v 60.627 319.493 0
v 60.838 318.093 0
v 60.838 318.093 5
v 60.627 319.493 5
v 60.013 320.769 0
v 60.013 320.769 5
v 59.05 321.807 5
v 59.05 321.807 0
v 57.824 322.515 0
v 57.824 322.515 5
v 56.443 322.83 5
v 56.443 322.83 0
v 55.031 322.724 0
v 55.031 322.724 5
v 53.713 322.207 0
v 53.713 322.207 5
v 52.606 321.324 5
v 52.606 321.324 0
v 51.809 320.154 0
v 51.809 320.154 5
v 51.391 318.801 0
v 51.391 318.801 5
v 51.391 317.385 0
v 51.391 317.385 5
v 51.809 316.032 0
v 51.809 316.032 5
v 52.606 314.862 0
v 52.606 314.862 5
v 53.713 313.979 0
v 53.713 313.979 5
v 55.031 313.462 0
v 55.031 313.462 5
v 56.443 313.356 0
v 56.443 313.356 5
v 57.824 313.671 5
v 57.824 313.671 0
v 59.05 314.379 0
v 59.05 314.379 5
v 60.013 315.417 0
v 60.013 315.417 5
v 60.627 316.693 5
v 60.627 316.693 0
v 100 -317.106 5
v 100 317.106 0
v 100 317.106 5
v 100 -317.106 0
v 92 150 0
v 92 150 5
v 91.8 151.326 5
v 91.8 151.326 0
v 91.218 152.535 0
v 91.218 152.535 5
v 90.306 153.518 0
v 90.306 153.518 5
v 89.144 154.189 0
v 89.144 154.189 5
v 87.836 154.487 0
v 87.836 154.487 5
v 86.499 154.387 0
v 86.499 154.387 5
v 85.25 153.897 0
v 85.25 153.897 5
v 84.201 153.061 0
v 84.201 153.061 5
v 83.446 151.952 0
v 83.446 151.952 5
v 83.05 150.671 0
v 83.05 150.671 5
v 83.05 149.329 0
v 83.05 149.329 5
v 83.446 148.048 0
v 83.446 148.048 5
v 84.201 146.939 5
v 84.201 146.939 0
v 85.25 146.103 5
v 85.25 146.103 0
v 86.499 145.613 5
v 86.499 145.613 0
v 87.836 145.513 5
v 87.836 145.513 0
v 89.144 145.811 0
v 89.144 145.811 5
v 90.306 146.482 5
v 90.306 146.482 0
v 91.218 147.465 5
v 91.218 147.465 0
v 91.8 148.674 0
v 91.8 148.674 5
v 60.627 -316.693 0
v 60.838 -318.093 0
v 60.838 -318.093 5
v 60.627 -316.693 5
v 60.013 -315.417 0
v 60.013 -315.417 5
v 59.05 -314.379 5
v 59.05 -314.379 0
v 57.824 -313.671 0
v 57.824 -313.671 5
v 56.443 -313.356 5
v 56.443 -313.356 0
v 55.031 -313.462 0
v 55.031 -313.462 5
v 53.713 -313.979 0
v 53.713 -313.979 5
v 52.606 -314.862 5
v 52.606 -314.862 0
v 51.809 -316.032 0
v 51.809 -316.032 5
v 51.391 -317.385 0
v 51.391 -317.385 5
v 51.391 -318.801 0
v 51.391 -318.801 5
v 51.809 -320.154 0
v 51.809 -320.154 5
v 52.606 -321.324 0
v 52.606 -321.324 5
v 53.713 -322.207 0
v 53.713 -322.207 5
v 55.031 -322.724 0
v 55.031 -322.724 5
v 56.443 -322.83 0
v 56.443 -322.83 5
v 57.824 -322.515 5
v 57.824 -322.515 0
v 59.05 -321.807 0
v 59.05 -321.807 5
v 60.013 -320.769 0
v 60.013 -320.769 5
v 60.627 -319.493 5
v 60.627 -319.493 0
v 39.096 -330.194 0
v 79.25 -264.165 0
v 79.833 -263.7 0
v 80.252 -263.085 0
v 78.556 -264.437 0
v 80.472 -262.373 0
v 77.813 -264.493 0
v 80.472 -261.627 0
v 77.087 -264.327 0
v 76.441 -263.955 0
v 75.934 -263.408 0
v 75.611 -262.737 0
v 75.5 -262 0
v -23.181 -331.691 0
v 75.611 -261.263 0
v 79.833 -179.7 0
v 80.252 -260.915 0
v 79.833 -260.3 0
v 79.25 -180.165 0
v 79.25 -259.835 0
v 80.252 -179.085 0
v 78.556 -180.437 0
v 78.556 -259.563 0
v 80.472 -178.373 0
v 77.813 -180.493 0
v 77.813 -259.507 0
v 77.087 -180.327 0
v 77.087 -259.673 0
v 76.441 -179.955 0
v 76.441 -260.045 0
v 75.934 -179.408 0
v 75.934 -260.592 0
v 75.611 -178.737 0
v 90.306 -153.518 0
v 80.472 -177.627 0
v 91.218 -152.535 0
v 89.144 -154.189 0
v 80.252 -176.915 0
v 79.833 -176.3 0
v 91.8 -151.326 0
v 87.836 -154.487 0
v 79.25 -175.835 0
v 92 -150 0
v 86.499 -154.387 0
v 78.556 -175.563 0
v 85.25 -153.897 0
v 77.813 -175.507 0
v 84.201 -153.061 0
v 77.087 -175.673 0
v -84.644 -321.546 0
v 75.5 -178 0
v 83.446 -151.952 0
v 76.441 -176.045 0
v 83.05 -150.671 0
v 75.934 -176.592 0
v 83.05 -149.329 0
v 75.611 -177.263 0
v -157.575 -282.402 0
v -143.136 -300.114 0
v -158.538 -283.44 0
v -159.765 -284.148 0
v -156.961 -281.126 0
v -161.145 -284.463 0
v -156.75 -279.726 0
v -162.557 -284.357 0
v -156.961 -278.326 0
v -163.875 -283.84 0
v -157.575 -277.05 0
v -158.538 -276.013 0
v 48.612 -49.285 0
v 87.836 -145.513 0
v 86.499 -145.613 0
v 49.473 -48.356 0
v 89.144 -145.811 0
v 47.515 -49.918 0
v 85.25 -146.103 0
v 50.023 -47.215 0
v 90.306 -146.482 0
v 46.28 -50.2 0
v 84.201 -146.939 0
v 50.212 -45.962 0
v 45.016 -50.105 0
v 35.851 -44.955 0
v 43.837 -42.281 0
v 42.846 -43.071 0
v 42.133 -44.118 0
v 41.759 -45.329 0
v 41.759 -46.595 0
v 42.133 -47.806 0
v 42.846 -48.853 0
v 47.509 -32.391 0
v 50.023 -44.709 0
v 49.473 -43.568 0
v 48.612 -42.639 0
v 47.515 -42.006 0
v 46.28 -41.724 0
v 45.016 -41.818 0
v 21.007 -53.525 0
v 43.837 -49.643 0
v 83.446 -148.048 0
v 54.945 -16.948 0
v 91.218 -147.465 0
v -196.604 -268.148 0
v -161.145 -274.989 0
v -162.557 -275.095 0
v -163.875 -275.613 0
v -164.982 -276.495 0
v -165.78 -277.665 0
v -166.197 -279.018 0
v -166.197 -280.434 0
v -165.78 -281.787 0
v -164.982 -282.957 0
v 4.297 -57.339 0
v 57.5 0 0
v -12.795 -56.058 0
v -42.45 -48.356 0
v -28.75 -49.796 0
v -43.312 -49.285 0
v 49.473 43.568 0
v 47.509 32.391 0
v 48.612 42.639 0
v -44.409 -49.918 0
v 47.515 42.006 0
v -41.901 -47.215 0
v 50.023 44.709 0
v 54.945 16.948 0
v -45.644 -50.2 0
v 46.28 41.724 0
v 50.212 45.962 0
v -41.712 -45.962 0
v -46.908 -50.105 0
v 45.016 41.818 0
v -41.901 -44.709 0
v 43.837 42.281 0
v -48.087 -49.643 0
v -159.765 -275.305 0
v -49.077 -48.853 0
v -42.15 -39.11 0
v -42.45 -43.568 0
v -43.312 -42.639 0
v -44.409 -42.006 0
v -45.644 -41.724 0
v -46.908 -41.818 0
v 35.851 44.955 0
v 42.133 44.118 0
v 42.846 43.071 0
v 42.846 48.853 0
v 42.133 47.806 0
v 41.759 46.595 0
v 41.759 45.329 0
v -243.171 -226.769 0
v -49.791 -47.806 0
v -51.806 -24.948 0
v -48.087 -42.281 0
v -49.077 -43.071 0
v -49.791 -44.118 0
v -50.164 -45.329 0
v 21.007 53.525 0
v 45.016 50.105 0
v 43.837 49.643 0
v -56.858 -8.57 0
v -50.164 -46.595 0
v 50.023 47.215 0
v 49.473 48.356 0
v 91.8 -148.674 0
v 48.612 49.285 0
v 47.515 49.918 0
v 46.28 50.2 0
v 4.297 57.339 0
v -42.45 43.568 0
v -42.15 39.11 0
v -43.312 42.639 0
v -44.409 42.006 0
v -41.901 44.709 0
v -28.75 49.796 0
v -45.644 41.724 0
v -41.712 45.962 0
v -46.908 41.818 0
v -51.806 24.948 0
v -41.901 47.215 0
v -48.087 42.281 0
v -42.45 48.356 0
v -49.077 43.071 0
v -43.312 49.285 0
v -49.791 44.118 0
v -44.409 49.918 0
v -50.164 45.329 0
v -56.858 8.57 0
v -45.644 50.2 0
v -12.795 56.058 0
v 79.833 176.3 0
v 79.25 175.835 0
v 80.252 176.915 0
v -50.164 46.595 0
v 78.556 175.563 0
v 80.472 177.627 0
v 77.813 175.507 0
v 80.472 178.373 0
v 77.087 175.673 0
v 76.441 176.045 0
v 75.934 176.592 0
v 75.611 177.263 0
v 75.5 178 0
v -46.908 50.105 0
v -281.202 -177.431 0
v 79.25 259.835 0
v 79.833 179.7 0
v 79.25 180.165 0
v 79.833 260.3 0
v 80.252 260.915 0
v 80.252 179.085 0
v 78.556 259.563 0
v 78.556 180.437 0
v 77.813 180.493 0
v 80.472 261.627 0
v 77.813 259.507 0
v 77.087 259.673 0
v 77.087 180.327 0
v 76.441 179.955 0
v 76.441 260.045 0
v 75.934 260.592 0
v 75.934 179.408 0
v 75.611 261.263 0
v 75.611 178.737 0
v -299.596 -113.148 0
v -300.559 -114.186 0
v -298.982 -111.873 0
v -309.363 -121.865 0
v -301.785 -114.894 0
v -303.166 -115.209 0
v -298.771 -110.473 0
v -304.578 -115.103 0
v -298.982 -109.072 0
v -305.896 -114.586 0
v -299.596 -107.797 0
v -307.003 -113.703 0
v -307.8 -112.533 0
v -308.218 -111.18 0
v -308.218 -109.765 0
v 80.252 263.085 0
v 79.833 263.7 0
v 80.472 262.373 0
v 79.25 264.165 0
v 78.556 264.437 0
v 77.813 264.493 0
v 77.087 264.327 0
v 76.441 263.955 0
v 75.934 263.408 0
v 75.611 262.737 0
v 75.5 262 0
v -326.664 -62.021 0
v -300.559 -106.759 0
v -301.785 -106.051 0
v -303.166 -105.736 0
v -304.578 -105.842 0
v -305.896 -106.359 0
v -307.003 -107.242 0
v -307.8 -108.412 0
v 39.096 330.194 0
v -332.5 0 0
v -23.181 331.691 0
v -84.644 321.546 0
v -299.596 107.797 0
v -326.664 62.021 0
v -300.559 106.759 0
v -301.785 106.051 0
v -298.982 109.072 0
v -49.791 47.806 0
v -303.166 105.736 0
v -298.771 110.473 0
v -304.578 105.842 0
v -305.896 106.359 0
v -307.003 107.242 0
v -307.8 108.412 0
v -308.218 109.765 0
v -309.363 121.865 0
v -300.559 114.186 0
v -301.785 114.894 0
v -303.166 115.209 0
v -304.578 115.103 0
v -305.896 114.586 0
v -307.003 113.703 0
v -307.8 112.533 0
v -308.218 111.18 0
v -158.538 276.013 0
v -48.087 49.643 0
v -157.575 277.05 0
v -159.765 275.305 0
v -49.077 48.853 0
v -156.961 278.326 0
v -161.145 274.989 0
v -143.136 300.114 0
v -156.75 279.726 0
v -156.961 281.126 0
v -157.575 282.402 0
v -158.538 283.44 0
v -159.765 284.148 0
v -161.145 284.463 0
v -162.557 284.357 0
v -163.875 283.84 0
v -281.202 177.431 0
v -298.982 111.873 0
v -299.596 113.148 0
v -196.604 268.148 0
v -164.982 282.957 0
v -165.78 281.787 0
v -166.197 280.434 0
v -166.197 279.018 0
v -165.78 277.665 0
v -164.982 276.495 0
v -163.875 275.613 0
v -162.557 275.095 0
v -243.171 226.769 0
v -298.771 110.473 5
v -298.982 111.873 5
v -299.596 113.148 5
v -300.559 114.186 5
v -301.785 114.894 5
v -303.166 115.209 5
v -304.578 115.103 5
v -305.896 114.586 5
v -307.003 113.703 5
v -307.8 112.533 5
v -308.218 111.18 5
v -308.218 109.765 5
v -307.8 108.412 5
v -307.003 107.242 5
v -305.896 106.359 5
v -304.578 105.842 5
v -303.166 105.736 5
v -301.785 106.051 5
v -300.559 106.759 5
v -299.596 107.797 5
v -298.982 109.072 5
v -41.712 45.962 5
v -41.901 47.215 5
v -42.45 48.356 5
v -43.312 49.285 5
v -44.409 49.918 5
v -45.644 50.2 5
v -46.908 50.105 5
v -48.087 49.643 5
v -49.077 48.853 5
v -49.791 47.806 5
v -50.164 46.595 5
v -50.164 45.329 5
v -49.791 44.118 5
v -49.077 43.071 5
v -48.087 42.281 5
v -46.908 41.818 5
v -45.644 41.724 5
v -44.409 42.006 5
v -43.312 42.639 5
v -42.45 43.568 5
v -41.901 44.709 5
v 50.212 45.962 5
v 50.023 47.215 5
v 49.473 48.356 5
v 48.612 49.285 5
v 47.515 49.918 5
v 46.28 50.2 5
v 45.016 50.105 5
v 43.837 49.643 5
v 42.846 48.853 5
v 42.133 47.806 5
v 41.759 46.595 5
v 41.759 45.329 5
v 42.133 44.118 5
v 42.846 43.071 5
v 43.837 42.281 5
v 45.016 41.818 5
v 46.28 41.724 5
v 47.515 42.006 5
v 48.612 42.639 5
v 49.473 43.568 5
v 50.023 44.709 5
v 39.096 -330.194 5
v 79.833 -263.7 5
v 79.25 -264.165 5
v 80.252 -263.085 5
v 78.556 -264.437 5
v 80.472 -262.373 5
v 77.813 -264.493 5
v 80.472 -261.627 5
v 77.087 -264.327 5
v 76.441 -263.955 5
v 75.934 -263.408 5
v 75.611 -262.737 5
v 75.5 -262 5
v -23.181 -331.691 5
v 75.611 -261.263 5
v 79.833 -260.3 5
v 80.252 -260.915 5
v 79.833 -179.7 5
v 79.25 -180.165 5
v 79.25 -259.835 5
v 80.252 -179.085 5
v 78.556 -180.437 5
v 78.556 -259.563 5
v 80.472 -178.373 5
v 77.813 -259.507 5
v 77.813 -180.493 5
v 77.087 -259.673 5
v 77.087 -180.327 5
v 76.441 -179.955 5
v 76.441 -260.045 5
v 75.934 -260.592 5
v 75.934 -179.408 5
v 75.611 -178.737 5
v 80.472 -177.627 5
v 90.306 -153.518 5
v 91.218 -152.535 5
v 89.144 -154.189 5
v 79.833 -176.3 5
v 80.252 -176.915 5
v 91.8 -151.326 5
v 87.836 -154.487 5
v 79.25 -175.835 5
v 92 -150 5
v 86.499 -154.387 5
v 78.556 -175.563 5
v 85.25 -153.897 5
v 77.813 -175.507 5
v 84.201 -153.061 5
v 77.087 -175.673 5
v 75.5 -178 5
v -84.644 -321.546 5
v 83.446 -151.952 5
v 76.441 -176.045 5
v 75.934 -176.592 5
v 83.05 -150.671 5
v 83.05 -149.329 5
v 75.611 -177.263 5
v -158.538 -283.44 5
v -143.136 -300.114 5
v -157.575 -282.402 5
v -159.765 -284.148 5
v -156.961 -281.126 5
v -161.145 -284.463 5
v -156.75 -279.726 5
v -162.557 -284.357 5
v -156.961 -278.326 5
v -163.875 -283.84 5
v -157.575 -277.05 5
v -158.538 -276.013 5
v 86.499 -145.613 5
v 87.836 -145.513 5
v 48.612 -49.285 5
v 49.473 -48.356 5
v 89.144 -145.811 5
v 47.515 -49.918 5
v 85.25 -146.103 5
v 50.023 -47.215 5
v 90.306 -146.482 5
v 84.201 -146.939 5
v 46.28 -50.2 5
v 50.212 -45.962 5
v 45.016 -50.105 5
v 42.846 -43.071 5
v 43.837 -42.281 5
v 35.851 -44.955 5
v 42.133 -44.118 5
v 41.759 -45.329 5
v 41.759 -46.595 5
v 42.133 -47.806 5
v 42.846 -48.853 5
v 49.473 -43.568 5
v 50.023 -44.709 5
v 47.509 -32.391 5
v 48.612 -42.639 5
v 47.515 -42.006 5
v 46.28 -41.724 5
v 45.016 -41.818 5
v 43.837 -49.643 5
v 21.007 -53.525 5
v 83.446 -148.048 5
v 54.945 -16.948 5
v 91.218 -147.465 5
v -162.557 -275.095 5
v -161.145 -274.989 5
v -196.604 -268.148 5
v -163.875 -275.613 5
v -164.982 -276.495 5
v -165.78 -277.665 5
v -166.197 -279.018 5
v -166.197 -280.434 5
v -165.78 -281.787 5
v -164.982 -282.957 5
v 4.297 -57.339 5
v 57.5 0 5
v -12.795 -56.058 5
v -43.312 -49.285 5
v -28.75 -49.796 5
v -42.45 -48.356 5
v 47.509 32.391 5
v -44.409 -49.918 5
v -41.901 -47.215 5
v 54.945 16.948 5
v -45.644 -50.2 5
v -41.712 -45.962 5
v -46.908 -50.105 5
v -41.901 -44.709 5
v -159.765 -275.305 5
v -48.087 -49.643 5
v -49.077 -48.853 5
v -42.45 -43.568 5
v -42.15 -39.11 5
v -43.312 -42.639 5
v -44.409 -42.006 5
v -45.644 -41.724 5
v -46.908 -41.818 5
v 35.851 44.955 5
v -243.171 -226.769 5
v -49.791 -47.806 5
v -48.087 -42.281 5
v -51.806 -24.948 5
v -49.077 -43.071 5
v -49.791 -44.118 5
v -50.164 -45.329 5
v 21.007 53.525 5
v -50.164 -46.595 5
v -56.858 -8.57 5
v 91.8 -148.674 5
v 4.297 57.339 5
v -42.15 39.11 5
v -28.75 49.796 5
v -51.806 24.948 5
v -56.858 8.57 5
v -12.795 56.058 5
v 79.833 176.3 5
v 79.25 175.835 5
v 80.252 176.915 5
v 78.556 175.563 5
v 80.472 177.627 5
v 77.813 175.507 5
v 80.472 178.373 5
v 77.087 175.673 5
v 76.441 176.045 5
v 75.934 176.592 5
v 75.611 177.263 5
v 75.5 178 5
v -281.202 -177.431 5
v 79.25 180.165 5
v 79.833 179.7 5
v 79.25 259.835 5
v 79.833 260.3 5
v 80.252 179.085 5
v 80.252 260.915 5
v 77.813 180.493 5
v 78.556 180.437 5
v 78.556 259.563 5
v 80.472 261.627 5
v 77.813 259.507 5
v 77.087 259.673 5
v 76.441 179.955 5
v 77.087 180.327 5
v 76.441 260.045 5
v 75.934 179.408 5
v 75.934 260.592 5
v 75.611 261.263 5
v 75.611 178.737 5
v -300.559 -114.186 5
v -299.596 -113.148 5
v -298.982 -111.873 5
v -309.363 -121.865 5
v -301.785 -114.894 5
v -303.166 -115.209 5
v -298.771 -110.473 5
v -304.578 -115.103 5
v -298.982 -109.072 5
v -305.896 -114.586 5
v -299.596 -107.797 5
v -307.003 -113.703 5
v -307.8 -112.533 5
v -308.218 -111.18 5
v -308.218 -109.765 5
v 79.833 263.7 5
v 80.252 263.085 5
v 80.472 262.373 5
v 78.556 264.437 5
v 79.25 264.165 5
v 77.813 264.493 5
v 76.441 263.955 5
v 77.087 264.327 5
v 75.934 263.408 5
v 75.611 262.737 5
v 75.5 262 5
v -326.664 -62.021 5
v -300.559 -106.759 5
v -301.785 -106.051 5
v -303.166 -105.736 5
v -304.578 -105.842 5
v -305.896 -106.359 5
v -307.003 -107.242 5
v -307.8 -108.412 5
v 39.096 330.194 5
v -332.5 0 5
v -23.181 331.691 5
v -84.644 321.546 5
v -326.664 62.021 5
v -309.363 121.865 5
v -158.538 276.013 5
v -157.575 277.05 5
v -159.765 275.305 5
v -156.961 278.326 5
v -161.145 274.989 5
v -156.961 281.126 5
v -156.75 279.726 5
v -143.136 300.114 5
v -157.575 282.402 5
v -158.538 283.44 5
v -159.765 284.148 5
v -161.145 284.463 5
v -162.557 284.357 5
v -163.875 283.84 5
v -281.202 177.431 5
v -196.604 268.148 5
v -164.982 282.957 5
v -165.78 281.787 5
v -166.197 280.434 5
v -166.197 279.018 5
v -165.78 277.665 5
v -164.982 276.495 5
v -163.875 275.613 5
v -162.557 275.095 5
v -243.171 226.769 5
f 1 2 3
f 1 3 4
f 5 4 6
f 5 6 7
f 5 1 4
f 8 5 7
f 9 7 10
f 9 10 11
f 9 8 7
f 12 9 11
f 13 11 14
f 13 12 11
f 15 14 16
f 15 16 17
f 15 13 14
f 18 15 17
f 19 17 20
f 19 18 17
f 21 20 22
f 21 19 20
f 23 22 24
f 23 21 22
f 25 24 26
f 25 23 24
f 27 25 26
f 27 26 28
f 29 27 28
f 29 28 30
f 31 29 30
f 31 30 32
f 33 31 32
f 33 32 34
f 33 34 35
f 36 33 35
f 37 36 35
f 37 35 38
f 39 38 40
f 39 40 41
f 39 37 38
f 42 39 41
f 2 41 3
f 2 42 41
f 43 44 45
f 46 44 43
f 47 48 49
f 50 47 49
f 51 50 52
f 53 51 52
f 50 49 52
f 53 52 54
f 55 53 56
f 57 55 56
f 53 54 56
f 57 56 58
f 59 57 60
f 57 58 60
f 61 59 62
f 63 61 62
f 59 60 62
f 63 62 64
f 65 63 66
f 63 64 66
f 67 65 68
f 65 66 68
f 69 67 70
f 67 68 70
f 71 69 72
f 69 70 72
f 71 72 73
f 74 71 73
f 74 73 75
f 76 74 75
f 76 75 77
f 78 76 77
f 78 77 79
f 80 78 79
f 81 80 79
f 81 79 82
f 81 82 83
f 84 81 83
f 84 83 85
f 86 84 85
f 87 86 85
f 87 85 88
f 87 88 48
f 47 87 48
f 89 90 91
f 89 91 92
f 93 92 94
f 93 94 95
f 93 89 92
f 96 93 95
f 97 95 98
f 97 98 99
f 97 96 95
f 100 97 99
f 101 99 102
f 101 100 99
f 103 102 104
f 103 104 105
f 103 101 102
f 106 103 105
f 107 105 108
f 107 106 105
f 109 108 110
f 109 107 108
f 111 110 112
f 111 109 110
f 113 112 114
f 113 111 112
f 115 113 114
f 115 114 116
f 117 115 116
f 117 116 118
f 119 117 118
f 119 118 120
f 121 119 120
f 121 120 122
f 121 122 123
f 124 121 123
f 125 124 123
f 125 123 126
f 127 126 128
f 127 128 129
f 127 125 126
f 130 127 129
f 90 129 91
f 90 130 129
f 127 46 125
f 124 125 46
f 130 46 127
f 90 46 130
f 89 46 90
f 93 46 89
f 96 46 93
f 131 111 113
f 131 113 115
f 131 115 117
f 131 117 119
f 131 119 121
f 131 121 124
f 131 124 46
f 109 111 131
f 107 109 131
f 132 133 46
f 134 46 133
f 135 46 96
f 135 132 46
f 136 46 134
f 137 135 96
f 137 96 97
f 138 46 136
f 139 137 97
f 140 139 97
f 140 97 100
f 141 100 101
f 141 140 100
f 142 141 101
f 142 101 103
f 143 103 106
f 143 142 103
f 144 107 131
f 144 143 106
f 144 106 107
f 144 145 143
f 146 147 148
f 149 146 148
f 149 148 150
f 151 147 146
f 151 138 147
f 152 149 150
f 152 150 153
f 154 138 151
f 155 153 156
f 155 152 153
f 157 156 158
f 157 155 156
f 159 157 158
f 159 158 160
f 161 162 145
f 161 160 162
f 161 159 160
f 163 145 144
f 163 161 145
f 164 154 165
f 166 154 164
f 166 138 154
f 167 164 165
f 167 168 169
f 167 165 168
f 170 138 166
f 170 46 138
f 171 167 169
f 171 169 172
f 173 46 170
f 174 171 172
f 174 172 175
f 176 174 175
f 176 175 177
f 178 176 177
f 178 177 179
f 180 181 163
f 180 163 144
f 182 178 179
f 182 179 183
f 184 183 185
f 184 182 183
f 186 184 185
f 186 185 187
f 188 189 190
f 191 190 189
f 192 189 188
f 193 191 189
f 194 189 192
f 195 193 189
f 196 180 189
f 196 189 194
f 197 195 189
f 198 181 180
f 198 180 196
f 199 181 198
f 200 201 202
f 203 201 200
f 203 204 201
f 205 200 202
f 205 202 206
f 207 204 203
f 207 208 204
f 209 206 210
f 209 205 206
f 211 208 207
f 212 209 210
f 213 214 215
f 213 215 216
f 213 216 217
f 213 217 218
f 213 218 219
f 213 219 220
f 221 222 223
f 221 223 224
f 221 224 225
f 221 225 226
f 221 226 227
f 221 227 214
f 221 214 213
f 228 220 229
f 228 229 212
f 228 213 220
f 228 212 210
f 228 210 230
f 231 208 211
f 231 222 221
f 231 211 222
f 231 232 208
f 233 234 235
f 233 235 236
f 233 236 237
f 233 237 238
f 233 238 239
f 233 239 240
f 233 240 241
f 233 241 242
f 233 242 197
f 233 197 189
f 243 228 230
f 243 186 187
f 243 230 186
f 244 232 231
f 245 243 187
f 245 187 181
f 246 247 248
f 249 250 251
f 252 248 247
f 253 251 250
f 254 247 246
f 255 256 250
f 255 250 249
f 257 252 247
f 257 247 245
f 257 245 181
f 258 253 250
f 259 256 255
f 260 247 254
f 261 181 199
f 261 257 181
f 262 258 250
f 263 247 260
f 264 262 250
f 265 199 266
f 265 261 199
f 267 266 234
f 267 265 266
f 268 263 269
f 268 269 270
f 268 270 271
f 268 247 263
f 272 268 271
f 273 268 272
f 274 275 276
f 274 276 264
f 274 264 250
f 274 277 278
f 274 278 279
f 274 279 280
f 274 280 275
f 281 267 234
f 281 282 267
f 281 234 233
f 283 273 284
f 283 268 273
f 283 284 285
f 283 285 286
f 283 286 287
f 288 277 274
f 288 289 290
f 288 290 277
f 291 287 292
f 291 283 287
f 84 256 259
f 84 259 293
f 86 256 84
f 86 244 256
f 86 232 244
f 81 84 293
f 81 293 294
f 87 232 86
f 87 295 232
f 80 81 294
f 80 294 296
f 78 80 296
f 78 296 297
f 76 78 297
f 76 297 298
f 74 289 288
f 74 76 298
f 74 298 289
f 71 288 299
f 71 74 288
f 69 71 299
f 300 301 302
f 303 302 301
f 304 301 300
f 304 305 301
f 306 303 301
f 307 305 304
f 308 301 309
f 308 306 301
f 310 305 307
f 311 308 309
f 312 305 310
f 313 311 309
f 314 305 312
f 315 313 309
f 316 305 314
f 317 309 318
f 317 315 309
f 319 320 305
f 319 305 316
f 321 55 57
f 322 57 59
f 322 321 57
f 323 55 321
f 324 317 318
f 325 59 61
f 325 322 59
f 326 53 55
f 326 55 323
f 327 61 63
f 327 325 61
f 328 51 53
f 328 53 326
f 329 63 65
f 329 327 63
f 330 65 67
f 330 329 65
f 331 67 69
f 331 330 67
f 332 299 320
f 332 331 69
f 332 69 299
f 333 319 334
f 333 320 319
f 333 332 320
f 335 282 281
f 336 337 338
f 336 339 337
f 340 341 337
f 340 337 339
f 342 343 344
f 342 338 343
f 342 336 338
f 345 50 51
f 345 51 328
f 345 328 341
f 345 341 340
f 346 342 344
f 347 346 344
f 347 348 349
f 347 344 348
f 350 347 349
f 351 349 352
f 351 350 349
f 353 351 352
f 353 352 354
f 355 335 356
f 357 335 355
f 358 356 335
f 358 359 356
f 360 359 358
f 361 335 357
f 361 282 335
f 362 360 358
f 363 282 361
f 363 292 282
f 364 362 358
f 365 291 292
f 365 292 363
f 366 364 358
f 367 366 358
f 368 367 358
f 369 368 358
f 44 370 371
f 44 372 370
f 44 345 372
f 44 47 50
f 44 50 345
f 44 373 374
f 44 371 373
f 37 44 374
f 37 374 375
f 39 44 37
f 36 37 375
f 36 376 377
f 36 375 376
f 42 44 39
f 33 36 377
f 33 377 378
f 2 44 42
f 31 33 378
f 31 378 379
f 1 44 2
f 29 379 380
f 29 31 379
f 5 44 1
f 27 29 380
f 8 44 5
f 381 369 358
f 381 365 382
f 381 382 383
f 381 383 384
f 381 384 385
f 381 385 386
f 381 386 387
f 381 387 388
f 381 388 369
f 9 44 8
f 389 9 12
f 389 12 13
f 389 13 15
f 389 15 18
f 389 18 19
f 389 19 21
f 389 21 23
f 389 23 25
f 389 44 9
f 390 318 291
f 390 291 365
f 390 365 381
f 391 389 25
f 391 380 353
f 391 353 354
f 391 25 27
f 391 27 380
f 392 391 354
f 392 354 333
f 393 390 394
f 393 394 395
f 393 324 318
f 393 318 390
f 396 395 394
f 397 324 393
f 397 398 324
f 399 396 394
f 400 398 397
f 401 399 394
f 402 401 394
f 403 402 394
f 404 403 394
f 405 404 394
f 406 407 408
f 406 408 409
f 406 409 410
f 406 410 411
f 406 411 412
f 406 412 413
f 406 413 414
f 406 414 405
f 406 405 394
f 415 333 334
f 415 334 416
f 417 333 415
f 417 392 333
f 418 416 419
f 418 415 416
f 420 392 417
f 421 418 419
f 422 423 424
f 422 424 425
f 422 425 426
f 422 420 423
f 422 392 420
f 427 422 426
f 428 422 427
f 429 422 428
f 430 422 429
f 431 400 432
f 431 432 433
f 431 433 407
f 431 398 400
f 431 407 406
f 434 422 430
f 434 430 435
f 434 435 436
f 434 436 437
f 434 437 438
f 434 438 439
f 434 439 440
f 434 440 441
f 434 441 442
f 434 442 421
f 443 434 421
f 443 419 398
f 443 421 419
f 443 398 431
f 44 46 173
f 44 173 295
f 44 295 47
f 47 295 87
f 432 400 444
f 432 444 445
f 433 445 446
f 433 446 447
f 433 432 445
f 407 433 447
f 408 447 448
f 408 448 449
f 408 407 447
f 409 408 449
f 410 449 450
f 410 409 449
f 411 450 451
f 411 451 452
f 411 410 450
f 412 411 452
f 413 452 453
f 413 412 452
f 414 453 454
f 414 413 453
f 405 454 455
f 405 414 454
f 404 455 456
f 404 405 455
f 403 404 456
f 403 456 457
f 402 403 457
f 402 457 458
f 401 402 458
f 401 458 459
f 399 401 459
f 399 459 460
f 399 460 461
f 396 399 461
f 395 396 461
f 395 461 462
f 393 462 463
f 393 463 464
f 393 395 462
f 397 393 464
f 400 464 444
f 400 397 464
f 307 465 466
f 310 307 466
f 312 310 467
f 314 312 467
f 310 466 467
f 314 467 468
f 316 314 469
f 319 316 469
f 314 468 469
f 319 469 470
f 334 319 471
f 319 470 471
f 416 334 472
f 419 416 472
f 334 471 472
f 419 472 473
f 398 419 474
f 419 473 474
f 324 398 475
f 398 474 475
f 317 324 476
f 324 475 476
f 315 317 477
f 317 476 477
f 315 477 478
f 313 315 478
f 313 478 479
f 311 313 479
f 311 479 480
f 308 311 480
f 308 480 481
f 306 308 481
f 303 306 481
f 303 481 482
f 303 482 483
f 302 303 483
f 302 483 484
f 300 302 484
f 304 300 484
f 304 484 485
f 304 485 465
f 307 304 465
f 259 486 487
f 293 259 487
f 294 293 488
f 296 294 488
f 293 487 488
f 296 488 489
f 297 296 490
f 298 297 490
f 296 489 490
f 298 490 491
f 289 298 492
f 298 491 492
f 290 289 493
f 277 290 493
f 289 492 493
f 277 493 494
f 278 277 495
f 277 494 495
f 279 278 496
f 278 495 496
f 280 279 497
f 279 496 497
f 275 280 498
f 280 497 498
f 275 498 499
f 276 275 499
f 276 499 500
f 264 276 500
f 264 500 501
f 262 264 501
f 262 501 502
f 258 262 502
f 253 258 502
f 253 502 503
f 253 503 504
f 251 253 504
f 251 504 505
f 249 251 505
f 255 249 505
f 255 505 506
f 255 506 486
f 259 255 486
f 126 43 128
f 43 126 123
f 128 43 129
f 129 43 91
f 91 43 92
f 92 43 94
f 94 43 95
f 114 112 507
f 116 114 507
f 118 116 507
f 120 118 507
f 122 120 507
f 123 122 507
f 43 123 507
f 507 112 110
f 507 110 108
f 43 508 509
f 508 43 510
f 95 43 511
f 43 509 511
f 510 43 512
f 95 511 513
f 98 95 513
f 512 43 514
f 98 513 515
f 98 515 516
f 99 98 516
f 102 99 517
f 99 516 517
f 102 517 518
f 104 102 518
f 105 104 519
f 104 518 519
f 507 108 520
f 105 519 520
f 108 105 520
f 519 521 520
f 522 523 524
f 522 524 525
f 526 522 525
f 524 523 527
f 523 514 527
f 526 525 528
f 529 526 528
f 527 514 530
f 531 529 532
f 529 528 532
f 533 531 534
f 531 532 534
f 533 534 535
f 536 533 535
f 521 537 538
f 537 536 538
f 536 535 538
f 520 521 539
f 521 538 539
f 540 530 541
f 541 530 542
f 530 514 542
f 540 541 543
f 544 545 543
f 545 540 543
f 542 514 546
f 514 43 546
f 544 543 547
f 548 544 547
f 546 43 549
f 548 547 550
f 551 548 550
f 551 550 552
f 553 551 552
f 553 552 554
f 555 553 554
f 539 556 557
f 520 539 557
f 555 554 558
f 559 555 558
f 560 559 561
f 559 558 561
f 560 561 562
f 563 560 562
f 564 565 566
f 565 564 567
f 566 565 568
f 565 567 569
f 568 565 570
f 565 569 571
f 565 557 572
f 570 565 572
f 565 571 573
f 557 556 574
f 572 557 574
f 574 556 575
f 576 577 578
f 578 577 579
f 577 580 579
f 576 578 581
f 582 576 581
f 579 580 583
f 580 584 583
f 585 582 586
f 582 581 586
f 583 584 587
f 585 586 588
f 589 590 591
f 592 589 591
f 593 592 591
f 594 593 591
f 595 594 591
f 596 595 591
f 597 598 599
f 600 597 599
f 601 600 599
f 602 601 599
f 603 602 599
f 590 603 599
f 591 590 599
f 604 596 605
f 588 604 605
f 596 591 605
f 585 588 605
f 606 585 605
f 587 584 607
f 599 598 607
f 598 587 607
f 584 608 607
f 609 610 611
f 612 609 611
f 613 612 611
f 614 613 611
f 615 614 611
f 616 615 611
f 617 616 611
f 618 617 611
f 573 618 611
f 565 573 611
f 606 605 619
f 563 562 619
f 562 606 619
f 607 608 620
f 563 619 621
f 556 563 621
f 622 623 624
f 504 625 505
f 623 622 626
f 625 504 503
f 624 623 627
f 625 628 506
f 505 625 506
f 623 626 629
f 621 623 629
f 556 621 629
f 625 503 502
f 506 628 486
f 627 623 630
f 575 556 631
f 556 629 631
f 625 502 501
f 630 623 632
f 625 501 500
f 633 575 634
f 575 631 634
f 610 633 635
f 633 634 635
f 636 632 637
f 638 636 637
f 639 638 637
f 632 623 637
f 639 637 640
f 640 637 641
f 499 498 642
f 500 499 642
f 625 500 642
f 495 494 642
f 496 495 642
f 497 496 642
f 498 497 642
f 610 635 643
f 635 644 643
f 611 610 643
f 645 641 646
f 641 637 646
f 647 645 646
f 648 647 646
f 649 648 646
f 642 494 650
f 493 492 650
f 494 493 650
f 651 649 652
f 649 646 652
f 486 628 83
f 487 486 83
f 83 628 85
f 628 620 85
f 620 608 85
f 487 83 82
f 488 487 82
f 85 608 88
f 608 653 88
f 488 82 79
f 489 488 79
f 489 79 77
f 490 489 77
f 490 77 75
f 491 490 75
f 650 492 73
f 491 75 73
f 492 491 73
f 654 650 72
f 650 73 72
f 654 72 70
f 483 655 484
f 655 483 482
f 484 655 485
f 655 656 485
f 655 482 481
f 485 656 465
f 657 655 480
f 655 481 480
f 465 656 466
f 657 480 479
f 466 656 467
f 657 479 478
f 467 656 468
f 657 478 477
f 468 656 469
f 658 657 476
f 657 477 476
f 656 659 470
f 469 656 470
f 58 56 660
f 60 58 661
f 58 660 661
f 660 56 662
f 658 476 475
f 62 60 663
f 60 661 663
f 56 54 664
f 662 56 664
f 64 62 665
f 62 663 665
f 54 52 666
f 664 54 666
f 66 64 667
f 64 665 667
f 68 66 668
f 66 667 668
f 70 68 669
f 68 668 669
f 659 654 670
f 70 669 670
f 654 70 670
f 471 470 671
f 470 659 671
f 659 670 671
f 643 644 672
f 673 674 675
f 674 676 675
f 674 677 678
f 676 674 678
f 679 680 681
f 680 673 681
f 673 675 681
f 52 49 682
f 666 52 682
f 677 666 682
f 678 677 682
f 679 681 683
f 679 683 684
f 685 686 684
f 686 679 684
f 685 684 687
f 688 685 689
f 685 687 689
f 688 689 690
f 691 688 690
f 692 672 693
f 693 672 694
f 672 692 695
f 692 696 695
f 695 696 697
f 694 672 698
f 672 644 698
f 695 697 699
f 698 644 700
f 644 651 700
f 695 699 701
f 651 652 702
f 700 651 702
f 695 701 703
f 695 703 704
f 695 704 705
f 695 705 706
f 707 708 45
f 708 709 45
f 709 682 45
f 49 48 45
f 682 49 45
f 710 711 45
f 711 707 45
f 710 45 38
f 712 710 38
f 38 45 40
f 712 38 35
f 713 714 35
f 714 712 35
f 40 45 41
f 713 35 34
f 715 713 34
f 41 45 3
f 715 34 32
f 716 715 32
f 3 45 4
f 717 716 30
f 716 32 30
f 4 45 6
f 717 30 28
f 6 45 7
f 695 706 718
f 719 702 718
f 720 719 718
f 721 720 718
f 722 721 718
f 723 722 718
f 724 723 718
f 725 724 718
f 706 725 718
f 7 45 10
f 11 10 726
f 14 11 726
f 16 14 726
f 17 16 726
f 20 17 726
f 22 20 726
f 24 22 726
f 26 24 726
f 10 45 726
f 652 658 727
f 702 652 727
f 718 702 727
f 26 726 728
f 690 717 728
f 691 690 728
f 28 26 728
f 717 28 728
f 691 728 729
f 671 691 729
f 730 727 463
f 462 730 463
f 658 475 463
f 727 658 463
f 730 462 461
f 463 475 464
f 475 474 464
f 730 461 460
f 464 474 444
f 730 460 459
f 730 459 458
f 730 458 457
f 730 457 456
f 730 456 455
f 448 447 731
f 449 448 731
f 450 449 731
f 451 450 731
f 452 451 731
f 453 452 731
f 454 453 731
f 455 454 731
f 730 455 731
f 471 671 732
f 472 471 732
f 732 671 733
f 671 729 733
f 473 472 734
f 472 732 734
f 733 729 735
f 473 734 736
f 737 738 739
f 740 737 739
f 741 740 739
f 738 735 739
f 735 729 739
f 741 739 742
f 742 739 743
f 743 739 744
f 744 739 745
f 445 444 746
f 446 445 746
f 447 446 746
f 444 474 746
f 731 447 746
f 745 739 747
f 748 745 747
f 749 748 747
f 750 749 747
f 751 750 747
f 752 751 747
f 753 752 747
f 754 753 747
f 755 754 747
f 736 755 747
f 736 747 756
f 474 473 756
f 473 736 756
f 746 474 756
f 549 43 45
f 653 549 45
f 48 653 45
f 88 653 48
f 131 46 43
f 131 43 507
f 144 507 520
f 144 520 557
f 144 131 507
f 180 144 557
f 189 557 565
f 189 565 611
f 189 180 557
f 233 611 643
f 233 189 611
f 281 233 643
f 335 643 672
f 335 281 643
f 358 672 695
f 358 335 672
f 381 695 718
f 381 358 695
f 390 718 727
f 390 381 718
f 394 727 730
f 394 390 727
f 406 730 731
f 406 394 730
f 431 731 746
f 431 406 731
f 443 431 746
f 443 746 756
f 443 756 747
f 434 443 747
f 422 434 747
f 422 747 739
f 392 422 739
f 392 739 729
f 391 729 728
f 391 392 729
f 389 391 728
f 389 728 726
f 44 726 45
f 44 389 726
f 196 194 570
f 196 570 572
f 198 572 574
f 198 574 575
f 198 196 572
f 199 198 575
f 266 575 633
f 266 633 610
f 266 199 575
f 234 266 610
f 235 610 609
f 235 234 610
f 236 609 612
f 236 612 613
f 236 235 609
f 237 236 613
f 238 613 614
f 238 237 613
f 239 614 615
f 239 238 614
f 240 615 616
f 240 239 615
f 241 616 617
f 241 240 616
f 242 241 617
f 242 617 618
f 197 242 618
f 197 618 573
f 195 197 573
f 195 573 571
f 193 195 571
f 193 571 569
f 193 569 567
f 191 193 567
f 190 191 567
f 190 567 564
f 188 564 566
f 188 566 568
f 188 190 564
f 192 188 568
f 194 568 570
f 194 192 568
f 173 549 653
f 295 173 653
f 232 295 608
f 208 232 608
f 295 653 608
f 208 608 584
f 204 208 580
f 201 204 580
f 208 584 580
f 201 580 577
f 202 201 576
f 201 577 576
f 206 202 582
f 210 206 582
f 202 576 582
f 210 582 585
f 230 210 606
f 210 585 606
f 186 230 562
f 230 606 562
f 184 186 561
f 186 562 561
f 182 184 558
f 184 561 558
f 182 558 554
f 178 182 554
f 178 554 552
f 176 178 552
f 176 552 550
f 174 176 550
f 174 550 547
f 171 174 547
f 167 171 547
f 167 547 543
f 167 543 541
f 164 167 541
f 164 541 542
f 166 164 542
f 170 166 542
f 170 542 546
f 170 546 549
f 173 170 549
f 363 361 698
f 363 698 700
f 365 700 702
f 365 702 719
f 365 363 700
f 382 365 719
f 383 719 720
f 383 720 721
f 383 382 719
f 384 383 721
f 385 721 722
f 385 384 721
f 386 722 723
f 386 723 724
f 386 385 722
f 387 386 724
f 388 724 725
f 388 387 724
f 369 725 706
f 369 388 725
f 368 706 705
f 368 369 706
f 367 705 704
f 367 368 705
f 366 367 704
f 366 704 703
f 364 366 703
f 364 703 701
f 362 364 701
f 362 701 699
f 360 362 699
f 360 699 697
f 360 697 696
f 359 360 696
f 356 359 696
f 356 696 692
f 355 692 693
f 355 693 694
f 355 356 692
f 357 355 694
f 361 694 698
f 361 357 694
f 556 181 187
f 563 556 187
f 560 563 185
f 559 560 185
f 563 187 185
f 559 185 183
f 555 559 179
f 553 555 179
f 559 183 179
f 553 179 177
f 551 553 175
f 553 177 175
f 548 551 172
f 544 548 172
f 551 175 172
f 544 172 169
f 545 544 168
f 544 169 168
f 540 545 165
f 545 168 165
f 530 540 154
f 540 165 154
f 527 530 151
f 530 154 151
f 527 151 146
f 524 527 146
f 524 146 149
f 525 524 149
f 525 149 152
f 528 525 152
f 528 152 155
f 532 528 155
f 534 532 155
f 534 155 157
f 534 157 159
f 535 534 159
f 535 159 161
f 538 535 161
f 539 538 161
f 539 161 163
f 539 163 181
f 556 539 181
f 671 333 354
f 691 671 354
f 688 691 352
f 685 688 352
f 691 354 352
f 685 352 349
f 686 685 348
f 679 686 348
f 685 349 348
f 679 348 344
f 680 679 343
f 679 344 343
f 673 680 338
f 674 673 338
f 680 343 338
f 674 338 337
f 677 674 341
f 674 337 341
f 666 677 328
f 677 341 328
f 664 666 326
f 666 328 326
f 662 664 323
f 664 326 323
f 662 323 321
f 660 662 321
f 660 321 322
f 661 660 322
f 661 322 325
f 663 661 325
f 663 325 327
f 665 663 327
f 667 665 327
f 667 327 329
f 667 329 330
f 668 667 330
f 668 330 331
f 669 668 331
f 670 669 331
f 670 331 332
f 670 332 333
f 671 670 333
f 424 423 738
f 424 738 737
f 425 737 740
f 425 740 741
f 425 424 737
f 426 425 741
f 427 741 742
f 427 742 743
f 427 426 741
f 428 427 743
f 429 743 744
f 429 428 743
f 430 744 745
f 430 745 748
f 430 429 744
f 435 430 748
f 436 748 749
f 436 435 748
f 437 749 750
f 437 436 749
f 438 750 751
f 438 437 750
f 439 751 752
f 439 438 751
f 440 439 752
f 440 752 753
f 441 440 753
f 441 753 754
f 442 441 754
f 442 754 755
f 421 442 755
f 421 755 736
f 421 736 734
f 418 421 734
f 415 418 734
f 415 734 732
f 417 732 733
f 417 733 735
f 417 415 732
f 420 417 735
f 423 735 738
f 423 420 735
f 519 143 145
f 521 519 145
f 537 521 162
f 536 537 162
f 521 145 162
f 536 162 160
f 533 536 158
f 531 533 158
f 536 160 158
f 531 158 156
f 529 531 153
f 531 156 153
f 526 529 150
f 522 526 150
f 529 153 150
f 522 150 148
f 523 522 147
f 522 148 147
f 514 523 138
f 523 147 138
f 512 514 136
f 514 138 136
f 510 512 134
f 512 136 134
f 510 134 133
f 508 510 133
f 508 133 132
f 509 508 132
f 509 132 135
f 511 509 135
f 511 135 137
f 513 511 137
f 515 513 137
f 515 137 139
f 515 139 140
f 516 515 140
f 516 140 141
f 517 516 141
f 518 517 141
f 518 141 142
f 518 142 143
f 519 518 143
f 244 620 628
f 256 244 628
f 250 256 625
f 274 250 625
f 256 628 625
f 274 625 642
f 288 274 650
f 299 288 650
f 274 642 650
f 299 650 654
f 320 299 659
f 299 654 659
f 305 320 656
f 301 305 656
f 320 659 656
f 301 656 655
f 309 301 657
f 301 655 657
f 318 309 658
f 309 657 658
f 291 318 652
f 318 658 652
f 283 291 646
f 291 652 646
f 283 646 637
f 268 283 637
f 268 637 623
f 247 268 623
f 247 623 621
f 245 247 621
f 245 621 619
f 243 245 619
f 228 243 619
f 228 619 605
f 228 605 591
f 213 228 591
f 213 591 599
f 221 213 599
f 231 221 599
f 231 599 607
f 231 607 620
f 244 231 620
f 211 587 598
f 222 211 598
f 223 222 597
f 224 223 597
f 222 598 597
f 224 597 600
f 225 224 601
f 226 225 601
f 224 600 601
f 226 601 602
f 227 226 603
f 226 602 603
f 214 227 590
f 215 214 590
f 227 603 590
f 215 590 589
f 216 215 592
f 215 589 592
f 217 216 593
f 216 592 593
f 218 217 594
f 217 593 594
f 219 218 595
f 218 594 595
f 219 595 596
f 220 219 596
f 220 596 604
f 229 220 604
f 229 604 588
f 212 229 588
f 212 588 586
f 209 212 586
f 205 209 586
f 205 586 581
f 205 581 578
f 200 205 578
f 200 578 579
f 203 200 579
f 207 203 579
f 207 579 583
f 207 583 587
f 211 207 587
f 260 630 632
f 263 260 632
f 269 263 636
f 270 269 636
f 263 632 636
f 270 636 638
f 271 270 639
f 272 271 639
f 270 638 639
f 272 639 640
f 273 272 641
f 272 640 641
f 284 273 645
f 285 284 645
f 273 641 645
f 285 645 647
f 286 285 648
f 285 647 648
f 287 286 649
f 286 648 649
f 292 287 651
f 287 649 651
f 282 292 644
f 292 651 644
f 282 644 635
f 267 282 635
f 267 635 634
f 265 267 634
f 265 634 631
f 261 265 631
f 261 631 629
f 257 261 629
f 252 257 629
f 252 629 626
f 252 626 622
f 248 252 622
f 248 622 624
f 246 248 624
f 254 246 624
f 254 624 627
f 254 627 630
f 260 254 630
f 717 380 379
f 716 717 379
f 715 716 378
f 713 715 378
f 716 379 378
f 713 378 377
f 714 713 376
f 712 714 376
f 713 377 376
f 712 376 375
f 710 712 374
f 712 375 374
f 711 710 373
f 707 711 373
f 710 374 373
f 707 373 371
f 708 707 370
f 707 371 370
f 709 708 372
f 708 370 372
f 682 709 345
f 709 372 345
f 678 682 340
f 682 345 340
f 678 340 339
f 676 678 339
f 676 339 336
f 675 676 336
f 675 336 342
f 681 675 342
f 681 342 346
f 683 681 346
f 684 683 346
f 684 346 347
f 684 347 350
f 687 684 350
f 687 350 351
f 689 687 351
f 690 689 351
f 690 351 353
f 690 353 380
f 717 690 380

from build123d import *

# Parameters (mm, degrees)
SKIZZE1_R                       = 4.75
LINEAR_AUSTRAGEN1_DEPTH         = 5
SKIZZE10_R                      = 57.5
SCHNITT_LINEAR_AUSTRAGEN3_DEPTH = 471.252591699
SKIZZE15_R                      = 4.25
SCHNITT_LINEAR_AUSTRAGEN5_DEPTH = 471.252591699
M6_GEWINDEBOHRUNG1_D            = 5
SKIZZE17_R                      = 4.5
SCHNITT_LINEAR_AUSTRAGEN7_DEPTH = 471.252591699


with BuildPart() as part:
    # Skizze1 → Linear austragen1 (new body)
    with BuildSketch(Plane.XY):
        with BuildLine():
            Line((100, 317.106054814), (100, -317.106054814))
            ThreePointArc((100, -317.106054814), (-332.5, 0), (100, 317.106054814))
        make_face()
        with Locations((56.088361386, 318.092904223)):
            Circle(SKIZZE1_R, mode=Mode.SUBTRACT)
        with Locations((56.088361386, -318.092904223)):
            Circle(SKIZZE1_R, mode=Mode.SUBTRACT)
        with Locations((-161.5, -279.726205422)):
            Circle(SKIZZE1_R, mode=Mode.SUBTRACT)
        with Locations((-303.520716514, -110.472506294)):
            Circle(SKIZZE1_R, mode=Mode.SUBTRACT)
        with Locations((-303.520716514, 110.472506294)):
            Circle(SKIZZE1_R, mode=Mode.SUBTRACT)
        with Locations((-161.5, 279.726205422)):
            Circle(SKIZZE1_R, mode=Mode.SUBTRACT)
    extrude(amount=LINEAR_AUSTRAGEN1_DEPTH)

    # Skizze10 → Schnitt-Linear austragen3 (cut, through all)
    with BuildSketch(Plane.XY.offset(5)):
        Circle(SKIZZE10_R)
    extrude(amount=-SCHNITT_LINEAR_AUSTRAGEN3_DEPTH, mode=Mode.SUBTRACT)

    # Skizze15 → Schnitt-Linear austragen5 (cut, through all)
    with BuildSketch(Plane.XY.offset(5)):
        with Locations((-45.961940777, 45.961940777)):
            Circle(SKIZZE15_R)
        with Locations((45.961940777, 45.961940777)):
            Circle(SKIZZE15_R)
        with Locations((45.961940777, -45.961940777)):
            Circle(SKIZZE15_R)
        with Locations((-45.961940777, -45.961940777)):
            Circle(SKIZZE15_R)
    extrude(amount=-SCHNITT_LINEAR_AUSTRAGEN5_DEPTH, mode=Mode.SUBTRACT)

    # M6 Gewindebohrung1 (through all)
    with Locations(Plane.XY.offset(5)):
        with Locations((78, -262), (78, -178), (78, 178), (78, 262)):
            Hole(M6_GEWINDEBOHRUNG1_D / 2)

    # Skizze17 → Schnitt-Linear austragen7 (cut, through all)
    with BuildSketch(Plane.XY.offset(5)):
        with Locations((87.5, -150)):
            Circle(SKIZZE17_R)
        with Locations((87.5, 150)):
            Circle(SKIZZE17_R)
    extrude(amount=-SCHNITT_LINEAR_AUSTRAGEN7_DEPTH, mode=Mode.SUBTRACT)


solid = part.part
